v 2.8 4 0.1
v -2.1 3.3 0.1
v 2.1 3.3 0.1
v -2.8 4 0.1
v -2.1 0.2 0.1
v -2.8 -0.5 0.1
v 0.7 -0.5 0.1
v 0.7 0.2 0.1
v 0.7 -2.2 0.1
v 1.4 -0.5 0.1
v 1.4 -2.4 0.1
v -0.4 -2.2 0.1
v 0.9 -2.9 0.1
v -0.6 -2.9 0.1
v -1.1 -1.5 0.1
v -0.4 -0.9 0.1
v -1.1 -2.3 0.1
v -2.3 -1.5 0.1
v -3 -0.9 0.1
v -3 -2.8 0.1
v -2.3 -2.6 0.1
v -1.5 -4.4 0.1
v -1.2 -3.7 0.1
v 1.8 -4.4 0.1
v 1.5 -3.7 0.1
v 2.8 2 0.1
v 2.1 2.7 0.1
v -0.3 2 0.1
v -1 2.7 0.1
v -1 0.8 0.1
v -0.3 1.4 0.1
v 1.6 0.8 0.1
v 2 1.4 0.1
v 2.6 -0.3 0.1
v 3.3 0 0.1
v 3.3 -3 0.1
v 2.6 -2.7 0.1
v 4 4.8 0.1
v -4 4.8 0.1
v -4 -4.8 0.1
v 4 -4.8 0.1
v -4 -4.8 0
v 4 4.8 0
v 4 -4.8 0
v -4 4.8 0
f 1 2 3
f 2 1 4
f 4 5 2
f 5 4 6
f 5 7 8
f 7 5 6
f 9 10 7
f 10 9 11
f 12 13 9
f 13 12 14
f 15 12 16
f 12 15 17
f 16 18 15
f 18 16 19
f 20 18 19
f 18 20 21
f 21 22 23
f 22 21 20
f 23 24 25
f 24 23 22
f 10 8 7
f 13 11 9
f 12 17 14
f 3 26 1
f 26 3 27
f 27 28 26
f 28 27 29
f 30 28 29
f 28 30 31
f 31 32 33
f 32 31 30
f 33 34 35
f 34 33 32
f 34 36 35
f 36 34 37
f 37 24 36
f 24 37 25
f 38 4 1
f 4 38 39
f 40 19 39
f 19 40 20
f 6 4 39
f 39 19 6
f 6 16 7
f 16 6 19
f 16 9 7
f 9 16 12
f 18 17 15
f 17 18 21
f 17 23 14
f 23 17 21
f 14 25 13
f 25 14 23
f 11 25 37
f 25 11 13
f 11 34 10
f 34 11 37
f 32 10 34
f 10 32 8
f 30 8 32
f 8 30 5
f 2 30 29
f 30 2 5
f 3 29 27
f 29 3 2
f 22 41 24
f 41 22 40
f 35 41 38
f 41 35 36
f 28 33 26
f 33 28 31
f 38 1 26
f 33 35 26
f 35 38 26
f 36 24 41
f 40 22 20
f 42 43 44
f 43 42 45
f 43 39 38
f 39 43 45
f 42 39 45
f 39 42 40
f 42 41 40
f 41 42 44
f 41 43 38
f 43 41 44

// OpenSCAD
// file: ../p/4-4edge.scad
use <../lib.scad>
$fa=1; $fs=0.2;
function ldraw_lib__4_4edge(realsolid=false) = [
// 0 Circle 1.0
// 0 Name: 4-4edge.dat
// 0 Author: James Jessiman
// 0 !LDRAW_ORG Primitive UPDATE 2017-01
// 0 !LICENSE Licensed under CC BY 2.0 and CC BY 4.0 : see CAreadme.txt
// 
// 0 BFC CERTIFY CCW
  [0,"BFC","CERTIFY"],
  [0,"BFC","CCW"],
// 
// 0 !HISTORY 1998-12-15 [PTadmin] Official Update 1998-10
// 0 !HISTORY 2005-12-28 [PTadmin] Official Update 2005-01
// 0 !HISTORY 2007-06-24 [PTadmin] Header formatted for Contributor Agreement
// 0 !HISTORY 2008-07-01 [PTadmin] Official Update 2008-01
// 0 !HISTORY 2017-01-15 [Steffen] BFCed
// 0 !HISTORY 2017-12-30 [PTadmin] Official Update 2017-01
// 
// 
// 2 24 1 0 0 0.9239 0 0.3827
  [2,24,1,0,0,0.9239,0,0.3827],
// 2 24 0.9239 0 0.3827 0.7071 0 0.7071
  [2,24,0.9239,0,0.3827,0.7071,0,0.7071],
// 2 24 0.7071 0 0.7071 0.3827 0 0.9239
  [2,24,0.7071,0,0.7071,0.3827,0,0.9239],
// 2 24 0.3827 0 0.9239 0 0 1
  [2,24,0.3827,0,0.9239,0,0,1],
// 2 24 0 0 1 -0.3827 0 0.9239
  [2,24,0,0,1,-0.3827,0,0.9239],
// 2 24 -0.3827 0 0.9239 -0.7071 0 0.7071
  [2,24,-0.3827,0,0.9239,-0.7071,0,0.7071],
// 2 24 -0.7071 0 0.7071 -0.9239 0 0.3827
  [2,24,-0.7071,0,0.7071,-0.9239,0,0.3827],
// 2 24 -0.9239 0 0.3827 -1 0 -0
  [2,24,-0.9239,0,0.3827,-1,0,-0],
// 2 24 -1 0 -0 -0.9239 0 -0.3827
  [2,24,-1,0,-0,-0.9239,0,-0.3827],
// 2 24 -0.9239 0 -0.3827 -0.7071 0 -0.7071
  [2,24,-0.9239,0,-0.3827,-0.7071,0,-0.7071],
// 2 24 -0.7071 0 -0.7071 -0.3827 0 -0.9239
  [2,24,-0.7071,0,-0.7071,-0.3827,0,-0.9239],
// 2 24 -0.3827 0 -0.9239 0 0 -1
  [2,24,-0.3827,0,-0.9239,0,0,-1],
// 2 24 0 0 -1 0.3827 0 -0.9239
  [2,24,0,0,-1,0.3827,0,-0.9239],
// 2 24 0.3827 0 -0.9239 0.7071 0 -0.7071
  [2,24,0.3827,0,-0.9239,0.7071,0,-0.7071],
// 2 24 0.7071 0 -0.7071 0.9239 0 -0.3827
  [2,24,0.7071,0,-0.7071,0.9239,0,-0.3827],
// 2 24 0.9239 0 -0.3827 1 0 0
  [2,24,0.9239,0,-0.3827,1,0,0],
];
module ldraw_lib__4_4edge(step=0, col=false, unit=2/5, alt=false, line=0.2, solid=!$preview)
    makepoly(ldraw_lib__4_4edge(solid), step=step, col=col, unit=unit, alt=alt, line=line, solid=solid);
ldraw_lib__4_4edge(line=0.2);
// file: ../p/4-4disc.scad
use <../lib.scad>
$fa=1; $fs=0.2;
function ldraw_lib__4_4disc(realsolid=false) = [
// 0 Disc 1.0
// 0 Name: 4-4disc.dat
// 0 Author: James Jessiman
// 0 !LDRAW_ORG Primitive UPDATE 2002-02
// 0 !LICENSE Licensed under CC BY 2.0 and CC BY 4.0 : see CAreadme.txt
// 
// 0 BFC CERTIFY CCW
  [0,"BFC","CERTIFY"],
  [0,"BFC","CCW"],
// 
// 0 !HISTORY 1998-12-15 [PTadmin] Official Update 1998-10
// 0 !HISTORY 2002-03-23 [sbliss] Added BFC statement
// 0 !HISTORY 2002-04-25 [PTadmin] Official Update 2002-02
// 0 !HISTORY 2007-06-24 [PTadmin] Header formatted for Contributor Agreement
// 0 !HISTORY 2008-07-01 [PTadmin] Official Update 2008-01
// 
// 
// 3 16 0 0 0 1 0 0 0.9239 0 0.3827
  [3,16,0,0,0,1,0,0,0.9239,0,0.3827],
// 3 16 0 0 0 0.9239 0 0.3827 0.7071 0 0.7071
  [3,16,0,0,0,0.9239,0,0.3827,0.7071,0,0.7071],
// 3 16 0 0 0 0.7071 0 0.7071 0.3827 0 0.9239
  [3,16,0,0,0,0.7071,0,0.7071,0.3827,0,0.9239],
// 3 16 0 0 0 0.3827 0 0.9239 0 0 1
  [3,16,0,0,0,0.3827,0,0.9239,0,0,1],
// 3 16 0 0 0 0 0 1 -0.3827 0 0.9239
  [3,16,0,0,0,0,0,1,-0.3827,0,0.9239],
// 3 16 0 0 0 -0.3827 0 0.9239 -0.7071 0 0.7071
  [3,16,0,0,0,-0.3827,0,0.9239,-0.7071,0,0.7071],
// 3 16 0 0 0 -0.7071 0 0.7071 -0.9239 0 0.3827
  [3,16,0,0,0,-0.7071,0,0.7071,-0.9239,0,0.3827],
// 3 16 0 0 0 -0.9239 0 0.3827 -1 0 -0
  [3,16,0,0,0,-0.9239,0,0.3827,-1,0,-0],
// 3 16 0 0 0 -1 0 -0 -0.9239 0 -0.3827
  [3,16,0,0,0,-1,0,-0,-0.9239,0,-0.3827],
// 3 16 0 0 0 -0.9239 0 -0.3827 -0.7071 0 -0.7071
  [3,16,0,0,0,-0.9239,0,-0.3827,-0.7071,0,-0.7071],
// 3 16 0 0 0 -0.7071 0 -0.7071 -0.3827 0 -0.9239
  [3,16,0,0,0,-0.7071,0,-0.7071,-0.3827,0,-0.9239],
// 3 16 0 0 0 -0.3827 0 -0.9239 0 0 -1
  [3,16,0,0,0,-0.3827,0,-0.9239,0,0,-1],
// 3 16 0 0 0 0 0 -1 0.3827 0 -0.9239
  [3,16,0,0,0,0,0,-1,0.3827,0,-0.9239],
// 3 16 0 0 0 0.3827 0 -0.9239 0.7071 0 -0.7071
  [3,16,0,0,0,0.3827,0,-0.9239,0.7071,0,-0.7071],
// 3 16 0 0 0 0.7071 0 -0.7071 0.9239 0 -0.3827
  [3,16,0,0,0,0.7071,0,-0.7071,0.9239,0,-0.3827],
// 3 16 0 0 0 0.9239 0 -0.3827 1 0 0
  [3,16,0,0,0,0.9239,0,-0.3827,1,0,0],
// 0
];
module ldraw_lib__4_4disc(step=0, col=false, unit=2/5, alt=false, line=0.2, solid=!$preview)
    makepoly(ldraw_lib__4_4disc(solid), step=step, col=col, unit=unit, alt=alt, line=line, solid=solid);
ldraw_lib__4_4disc(line=0.2);
// file: ../p/4-4cyli.scad
use <../lib.scad>
$fa=1; $fs=0.2;
function ldraw_lib__4_4cyli(realsolid=false) = [
// 0 Cylinder 1.0
// 0 Name: 4-4cyli.dat
// 0 Author: James Jessiman
// 0 !LDRAW_ORG Primitive UPDATE 2005-01
// 0 !LICENSE Licensed under CC BY 2.0 and CC BY 4.0 : see CAreadme.txt
// 
// 0 BFC CERTIFY CCW
  [0,"BFC","CERTIFY"],
  [0,"BFC","CCW"],
// 
// 0 !HISTORY 1998-12-15 [PTadmin] Official Update 1998-10
// 0 !HISTORY 2002-03-23 [sbliss] Added BFC statement; merged headers from files in distributions LDraw 0.27 and Complete.
// 0 !HISTORY 2002-04-25 [PTadmin] Official Update 2002-02
// 0 !HISTORY 2004-12-14 [guyvivan] BFC CCW
// 0 !HISTORY 2005-12-28 [PTadmin] Official Update 2005-01
// 0 !HISTORY 2007-06-24 [PTadmin] Header formatted for Contributor Agreement
// 0 !HISTORY 2008-07-01 [PTadmin] Official Update 2008-01
// 
// 
// 4 16 1 1 0 0.9239 1 0.3827 0.9239 0 0.3827 1 0 0
  [4,16,1,1,0,0.9239,1,0.3827,0.9239,0,0.3827,1,0,0],
// 5 24 1 0 0 1 1 0 0.9239 0 0.3827 0.9239 0 -0.3827
  [5,24,1,0,0,1,1,0,0.9239,0,0.3827,0.9239,0,-0.3827],
// 4 16 0.9239 1 0.3827 0.7071 1 0.7071 0.7071 0 0.7071 0.9239 0 0.3827
  [4,16,0.9239,1,0.3827,0.7071,1,0.7071,0.7071,0,0.7071,0.9239,0,0.3827],
// 5 24 0.9239 0 0.3827 0.9239 1 0.3827 0.7071 0 0.7071 1 0 0
  [5,24,0.9239,0,0.3827,0.9239,1,0.3827,0.7071,0,0.7071,1,0,0],
// 4 16 0.7071 1 0.7071 0.3827 1 0.9239 0.3827 0 0.9239 0.7071 0 0.7071
  [4,16,0.7071,1,0.7071,0.3827,1,0.9239,0.3827,0,0.9239,0.7071,0,0.7071],
// 5 24 0.7071 0 0.7071 0.7071 1 0.7071 0.3827 0 0.9239 0.9239 0 0.3827
  [5,24,0.7071,0,0.7071,0.7071,1,0.7071,0.3827,0,0.9239,0.9239,0,0.3827],
// 4 16 0.3827 1 0.9239 0 1 1 0 0 1 0.3827 0 0.9239
  [4,16,0.3827,1,0.9239,0,1,1,0,0,1,0.3827,0,0.9239],
// 5 24 0.3827 0 0.9239 0.3827 1 0.9239 0 0 1 0.7071 0 0.7071
  [5,24,0.3827,0,0.9239,0.3827,1,0.9239,0,0,1,0.7071,0,0.7071],
// 4 16 0 1 1 -0.3827 1 0.9239 -0.3827 0 0.9239 0 0 1
  [4,16,0,1,1,-0.3827,1,0.9239,-0.3827,0,0.9239,0,0,1],
// 5 24 0 0 1 0 1 1 -0.3827 0 0.9239 0.3827 0 0.9239
  [5,24,0,0,1,0,1,1,-0.3827,0,0.9239,0.3827,0,0.9239],
// 4 16 -0.3827 1 0.9239 -0.7071 1 0.7071 -0.7071 0 0.7071 -0.3827 0 0.9239
  [4,16,-0.3827,1,0.9239,-0.7071,1,0.7071,-0.7071,0,0.7071,-0.3827,0,0.9239],
// 5 24 -0.3827 0 0.9239 -0.3827 1 0.9239 -0.7071 0 0.7071 0 0 1
  [5,24,-0.3827,0,0.9239,-0.3827,1,0.9239,-0.7071,0,0.7071,0,0,1],
// 4 16 -0.7071 1 0.7071 -0.9239 1 0.3827 -0.9239 0 0.3827 -0.7071 0 0.7071
  [4,16,-0.7071,1,0.7071,-0.9239,1,0.3827,-0.9239,0,0.3827,-0.7071,0,0.7071],
// 5 24 -0.7071 0 0.7071 -0.7071 1 0.7071 -0.9239 0 0.3827 -0.3827 0 0.9239
  [5,24,-0.7071,0,0.7071,-0.7071,1,0.7071,-0.9239,0,0.3827,-0.3827,0,0.9239],
// 4 16 -0.9239 1 0.3827 -1 1 0 -1 0 0 -0.9239 0 0.3827
  [4,16,-0.9239,1,0.3827,-1,1,0,-1,0,0,-0.9239,0,0.3827],
// 5 24 -0.9239 0 0.3827 -0.9239 1 0.3827 -1 0 0 -0.7071 0 0.7071
  [5,24,-0.9239,0,0.3827,-0.9239,1,0.3827,-1,0,0,-0.7071,0,0.7071],
// 4 16 -1 1 0 -0.9239 1 -0.3827 -0.9239 0 -0.3827 -1 0 0
  [4,16,-1,1,0,-0.9239,1,-0.3827,-0.9239,0,-0.3827,-1,0,0],
// 5 24 -1 0 0 -1 1 0 -0.9239 0 -0.3827 -0.9239 0 0.3827
  [5,24,-1,0,0,-1,1,0,-0.9239,0,-0.3827,-0.9239,0,0.3827],
// 4 16 -0.9239 1 -0.3827 -0.7071 1 -0.7071 -0.7071 0 -0.7071 -0.9239 0 -0.3827
  [4,16,-0.9239,1,-0.3827,-0.7071,1,-0.7071,-0.7071,0,-0.7071,-0.9239,0,-0.3827],
// 5 24 -0.9239 0 -0.3827 -0.9239 1 -0.3827 -0.7071 0 -0.7071 -1 0 0
  [5,24,-0.9239,0,-0.3827,-0.9239,1,-0.3827,-0.7071,0,-0.7071,-1,0,0],
// 4 16 -0.7071 1 -0.7071 -0.3827 1 -0.9239 -0.3827 0 -0.9239 -0.7071 0 -0.7071
  [4,16,-0.7071,1,-0.7071,-0.3827,1,-0.9239,-0.3827,0,-0.9239,-0.7071,0,-0.7071],
// 5 24 -0.7071 0 -0.7071 -0.7071 1 -0.7071 -0.3827 0 -0.9239 -0.9239 0 -0.3827
  [5,24,-0.7071,0,-0.7071,-0.7071,1,-0.7071,-0.3827,0,-0.9239,-0.9239,0,-0.3827],
// 4 16 -0.3827 1 -0.9239 0 1 -1 0 0 -1 -0.3827 0 -0.9239
  [4,16,-0.3827,1,-0.9239,0,1,-1,0,0,-1,-0.3827,0,-0.9239],
// 5 24 -0.3827 0 -0.9239 -0.3827 1 -0.9239 0 0 -1 -0.7071 0 -0.7071
  [5,24,-0.3827,0,-0.9239,-0.3827,1,-0.9239,0,0,-1,-0.7071,0,-0.7071],
// 4 16 0 1 -1 0.3827 1 -0.9239 0.3827 0 -0.9239 0 0 -1
  [4,16,0,1,-1,0.3827,1,-0.9239,0.3827,0,-0.9239,0,0,-1],
// 5 24 0 0 -1 0 1 -1 0.3827 0 -0.9239 -0.3827 0 -0.9239
  [5,24,0,0,-1,0,1,-1,0.3827,0,-0.9239,-0.3827,0,-0.9239],
// 4 16 0.3827 1 -0.9239 0.7071 1 -0.7071 0.7071 0 -0.7071 0.3827 0 -0.9239
  [4,16,0.3827,1,-0.9239,0.7071,1,-0.7071,0.7071,0,-0.7071,0.3827,0,-0.9239],
// 5 24 0.3827 0 -0.9239 0.3827 1 -0.9239 0.7071 0 -0.7071 0 0 -1
  [5,24,0.3827,0,-0.9239,0.3827,1,-0.9239,0.7071,0,-0.7071,0,0,-1],
// 4 16 0.7071 1 -0.7071 0.9239 1 -0.3827 0.9239 0 -0.3827 0.7071 0 -0.7071
  [4,16,0.7071,1,-0.7071,0.9239,1,-0.3827,0.9239,0,-0.3827,0.7071,0,-0.7071],
// 5 24 0.7071 0 -0.7071 0.7071 1 -0.7071 0.9239 0 -0.3827 0.3827 0 -0.9239
  [5,24,0.7071,0,-0.7071,0.7071,1,-0.7071,0.9239,0,-0.3827,0.3827,0,-0.9239],
// 4 16 0.9239 1 -0.3827 1 1 0 1 0 0 0.9239 0 -0.3827
  [4,16,0.9239,1,-0.3827,1,1,0,1,0,0,0.9239,0,-0.3827],
// 5 24 0.9239 0 -0.3827 0.9239 1 -0.3827 1 0 0 0.7071 0 -0.7071
  [5,24,0.9239,0,-0.3827,0.9239,1,-0.3827,1,0,0,0.7071,0,-0.7071],
// 0
];
module ldraw_lib__4_4cyli(step=0, col=false, unit=2/5, alt=false, line=0.2, solid=!$preview)
    makepoly(ldraw_lib__4_4cyli(solid), step=step, col=col, unit=unit, alt=alt, line=line, solid=solid);
ldraw_lib__4_4cyli(line=0.2);
// file: ../p/stud3.scad
use <../lib.scad>
use <4-4cyli.scad>
use <4-4disc.scad>
use <4-4edge.scad>
$fa=1; $fs=0.2;
function ldraw_lib__stud3(realsolid=false) = realsolid ? 
    [openscad(translate([0,0,-eps()], o=cylinder(4+eps(), r=4)),2)] : [
// 0 Stud Tube Solid
// 0 Name: stud3.dat
// 0 Author: James Jessiman
// 0 !LDRAW_ORG Primitive UPDATE 2012-01
// 0 !LICENSE Licensed under CC BY 2.0 and CC BY 4.0 : see CAreadme.txt
// 
// 0 BFC CERTIFY CCW
  [0,"BFC","CERTIFY"],
  [0,"BFC","CCW"],
// 
// 0 !HISTORY 2002-04-04 [sbliss] Modified for BFC compliance
// 0 !HISTORY 2002-04-25 [PTadmin] Official Update 2002-02
// 0 !HISTORY 2007-06-24 [PTadmin] Header formatted for Contributor Agreement
// 0 !HISTORY 2008-07-01 [PTadmin] Official Update 2008-01
// 0 !HISTORY 2012-02-16 [Philo] Changed to CCW
// 0 !HISTORY 2012-03-30 [PTadmin] Official Update 2012-01
// 
// 
// 1 16 0 -4 0 4 0 0 0 1 0 0 0 4 4-4edge.dat
  [1,16,0,-4,0,4,0,0,0,1,0,0,0,4, ldraw_lib__4_4edge(realsolid)],
// 1 16 0 0 0 4 0 0 0 1 0 0 0 4 4-4edge.dat
  [1,16,0,0,0,4,0,0,0,1,0,0,0,4, ldraw_lib__4_4edge(realsolid)],
// 1 16 0 -4 0 4 0 0 0 1 0 0 0 4 4-4disc.dat
  [1,16,0,-4,0,4,0,0,0,1,0,0,0,4, ldraw_lib__4_4disc(realsolid)],
// 1 16 0 -4 0 4 0 0 0 4 0 0 0 4 4-4cyli.dat
  [1,16,0,-4,0,4,0,0,0,4,0,0,0,4, ldraw_lib__4_4cyli(realsolid)],
];
module ldraw_lib__stud3(step=0, col=false, unit=2/5, alt=false, line=0.2, solid=!$preview)
    makepoly(ldraw_lib__stud3(solid), step=step, col=col, unit=unit, alt=alt, line=line, solid=solid);
ldraw_lib__stud3(line=0.2);
// file: ../p/stud.scad
use <../lib.scad>
use <4-4cyli.scad>
use <4-4disc.scad>
use <4-4edge.scad>
$fa=1; $fs=0.2;
function ldraw_lib__stud(realsolid=false) = realsolid ? 
    [openscad(translate([0,0,-eps()], o=cylinder(4+eps(), r=6)),2)] : [
// 0 Stud
// 0 Name: stud.dat
// 0 Author: James Jessiman
// 0 !LDRAW_ORG Primitive UPDATE 2012-01
// 0 !LICENSE Licensed under CC BY 2.0 and CC BY 4.0 : see CAreadme.txt
// 
// 0 BFC CERTIFY CCW
  [0,"BFC","CERTIFY"],
  [0,"BFC","CCW"],
// 
// 0 !HISTORY 2002-04-04 [sbliss] Modified for BFC compliance
// 0 !HISTORY 2002-04-25 [PTadmin] Official Update 2002-02
// 0 !HISTORY 2007-06-24 [PTadmin] Header formatted for Contributor Agreement
// 0 !HISTORY 2008-07-01 [PTadmin] Official Update 2008-01
// 0 !HISTORY 2012-02-16 [Philo] Changed to CCW
// 0 !HISTORY 2012-03-30 [PTadmin] Official Update 2012-01
// 
// 
// 1 16 0 0 0 6 0 0 0 1 0 0 0 6 4-4edge.dat
  [1,16,0,0,0,6,0,0,0,1,0,0,0,6, ldraw_lib__4_4edge(realsolid)],
// 1 16 0 -4 0 6 0 0 0 1 0 0 0 6 4-4edge.dat
  [1,16,0,-4,0,6,0,0,0,1,0,0,0,6, ldraw_lib__4_4edge(realsolid)],
// 1 16 0 0 0 6 0 0 0 -4 0 0 0 6 4-4cyli.dat
  [1,16,0,0,0,6,0,0,0,-4,0,0,0,6, ldraw_lib__4_4cyli(realsolid)],
// 1 16 0 -4 0 6 0 0 0 1 0 0 0 6 4-4disc.dat
  [1,16,0,-4,0,6,0,0,0,1,0,0,0,6, ldraw_lib__4_4disc(realsolid)],
];
module ldraw_lib__stud(step=0, col=false, unit=2/5, alt=false, line=0.2, solid=!$preview)
    makepoly(ldraw_lib__stud(solid), step=step, col=col, unit=unit, alt=alt, line=line, solid=solid);
ldraw_lib__stud(line=0.2);
// file: ../p/box5.scad
use <../lib.scad>
$fa=1; $fs=0.2;
function ldraw_lib__box5(realsolid=false) = [
// 0 Box with 5 Faces and All Edges
// 0 Name: box5.dat
// 0 Author: James Jessiman
// 0 !LDRAW_ORG Primitive UPDATE 2012-01
// 0 !LICENSE Licensed under CC BY 2.0 and CC BY 4.0 : see CAreadme.txt
// 
// 0 BFC CERTIFY CCW
  [0,"BFC","CERTIFY"],
  [0,"BFC","CCW"],
// 
// 0 !HISTORY 2002-04-03 [sbliss] Modified for BFC compliance
// 0 !HISTORY 2002-04-25 [PTadmin] Official Update 2002-02
// 0 !HISTORY 2007-06-24 [PTadmin] Header formatted for Contributor Agreement
// 0 !HISTORY 2008-07-01 [PTadmin] Official Update 2008-01
// 0 !HISTORY 2012-02-16 [Philo] Changed to CCW
// 0 !HISTORY 2012-03-30 [PTadmin] Official Update 2012-01
// 
// 
// 2 24 1 1 1 -1 1 1
  [2,24,1,1,1,-1,1,1],
// 2 24 -1 1 1 -1 1 -1
  [2,24,-1,1,1,-1,1,-1],
// 2 24 -1 1 -1 1 1 -1
  [2,24,-1,1,-1,1,1,-1],
// 2 24 1 1 -1 1 1 1
  [2,24,1,1,-1,1,1,1],
// 2 24 1 0 1 -1 0 1
  [2,24,1,0,1,-1,0,1],
// 2 24 -1 0 1 -1 0 -1
  [2,24,-1,0,1,-1,0,-1],
// 2 24 -1 0 -1 1 0 -1
  [2,24,-1,0,-1,1,0,-1],
// 2 24 1 0 -1 1 0 1
  [2,24,1,0,-1,1,0,1],
// 2 24 1 0 1 1 1 1
  [2,24,1,0,1,1,1,1],
// 2 24 -1 0 1 -1 1 1
  [2,24,-1,0,1,-1,1,1],
// 2 24 1 0 -1 1 1 -1
  [2,24,1,0,-1,1,1,-1],
// 2 24 -1 0 -1 -1 1 -1
  [2,24,-1,0,-1,-1,1,-1],
// 4 16 -1 1 1 1 1 1 1 1 -1 -1 1 -1
  [4,16,-1,1,1,1,1,1,1,1,-1,-1,1,-1],
// 4 16 -1 1 1 -1 0 1 1 0 1 1 1 1
  [4,16,-1,1,1,-1,0,1,1,0,1,1,1,1],
// 4 16 -1 1 -1 -1 0 -1 -1 0 1 -1 1 1
  [4,16,-1,1,-1,-1,0,-1,-1,0,1,-1,1,1],
// 4 16 1 1 -1 1 0 -1 -1 0 -1 -1 1 -1
  [4,16,1,1,-1,1,0,-1,-1,0,-1,-1,1,-1],
// 4 16 1 1 1 1 0 1 1 0 -1 1 1 -1
  [4,16,1,1,1,1,0,1,1,0,-1,1,1,-1],
];
module ldraw_lib__box5(step=0, col=false, unit=2/5, alt=false, line=0.2, solid=!$preview)
    makepoly(ldraw_lib__box5(solid), step=step, col=col, unit=unit, alt=alt, line=line, solid=solid);
ldraw_lib__box5(line=0.2);
// file: ../p/box4t.scad
use <../lib.scad>
$fa=1; $fs=0.2;
function ldraw_lib__box4t(realsolid=false) = [
// 0 Box with 4 Adjacent Faces and All Edges
// 0 Name: box4t.dat
// 0 Author: Tore Eriksson [Tore_Eriksson]
// 0 !LDRAW_ORG Primitive UPDATE 2003-02
// 0 !LICENSE Licensed under CC BY 2.0 and CC BY 4.0 : see CAreadme.txt
// 
// 0 BFC CERTIFY CCW
  [0,"BFC","CERTIFY"],
  [0,"BFC","CCW"],
// 
// 0 !HISTORY 1997-09-29 [PTadmin] Official Update 1997-15
// 0 !HISTORY 2002-08-31 [izanette] Modified with WINDZ for BFC compliance
// 0 !HISTORY 2003-08-01 [PTadmin] Official Update 2003-02
// 0 !HISTORY 2007-06-24 [PTadmin] Header formatted for Contributor Agreement
// 0 !HISTORY 2008-07-01 [PTadmin] Official Update 2008-01
// 
// 
// 2 24 1 1 1 -1 1 1
  [2,24,1,1,1,-1,1,1],
// 2 24 -1 1 1 -1 1 -1
  [2,24,-1,1,1,-1,1,-1],
// 2 24 -1 1 -1 1 1 -1
  [2,24,-1,1,-1,1,1,-1],
// 2 24 1 1 -1 1 1 1
  [2,24,1,1,-1,1,1,1],
// 2 24 1 0 1 -1 0 1
  [2,24,1,0,1,-1,0,1],
// 2 24 -1 0 1 -1 0 -1
  [2,24,-1,0,1,-1,0,-1],
// 2 24 -1 0 -1 1 0 -1
  [2,24,-1,0,-1,1,0,-1],
// 2 24 1 0 -1 1 0 1
  [2,24,1,0,-1,1,0,1],
// 2 24 1 0 1 1 1 1
  [2,24,1,0,1,1,1,1],
// 2 24 -1 0 1 -1 1 1
  [2,24,-1,0,1,-1,1,1],
// 2 24 1 0 -1 1 1 -1
  [2,24,1,0,-1,1,1,-1],
// 2 24 -1 0 -1 -1 1 -1
  [2,24,-1,0,-1,-1,1,-1],
// 4 16 1 1 1 1 1 -1 -1 1 -1 -1 1 1
  [4,16,1,1,1,1,1,-1,-1,1,-1,-1,1,1],
// 4 16 1 1 1 -1 1 1 -1 0 1 1 0 1
  [4,16,1,1,1,-1,1,1,-1,0,1,1,0,1],
// 4 16 -1 1 1 -1 1 -1 -1 0 -1 -1 0 1
  [4,16,-1,1,1,-1,1,-1,-1,0,-1,-1,0,1],
// 0 4 16 -1 1 -1 -1 0 -1 1 0 -1 1 1 -1
// 4 16 1 1 -1 1 1 1 1 0 1 1 0 -1
  [4,16,1,1,-1,1,1,1,1,0,1,1,0,-1],
// 0
];
module ldraw_lib__box4t(step=0, col=false, unit=2/5, alt=false, line=0.2, solid=!$preview)
    makepoly(ldraw_lib__box4t(solid), step=step, col=col, unit=unit, alt=alt, line=line, solid=solid);
ldraw_lib__box4t(line=0.2);
// file: s/3004s01.scad
use <../../lib.scad>
use <../../p/box4t.scad>
use <../../p/box5.scad>
use <../../p/stud.scad>
use <../../p/stud3.scad>
$fa=1; $fs=0.2;
function ldraw_lib__s__3004s01(realsolid=false) = [
// 0 ~Brick  1 x  2 without Front Face
// 0 Name: s\3004s01.dat
// 0 Author: James Jessiman
// 0 !LDRAW_ORG Subpart UPDATE 2003-03
// 0 !LICENSE Licensed under CC BY 2.0 and CC BY 4.0 : see CAreadme.txt
// 
// 0 BFC CERTIFY CCW
  [0,"BFC","CERTIFY"],
  [0,"BFC","CCW"],
// 
// 0 !HISTORY 2003-09-07 [jriley] Subfiling, BFC
// 0 !HISTORY 2003-12-19 [PTadmin] Official Update 2003-03
// 0 !HISTORY 2007-08-29 [PTadmin] Header formatted for Contributor Agreement
// 0 !HISTORY 2008-07-01 [PTadmin] Official Update 2008-01
// 
// 
// 1 16 0 4 0 1 0 0 0 -5 0 0 0 1 stud3.dat
  [1,16,0,4,0,1,0,0,0,-5,0,0,0,1, ldraw_lib__stud3(realsolid)],
// 0 BFC INVERTNEXT
  [0,"BFC","INVERTNEXT"],
// 1 16 0 24 0 16 0 0 0 -20 0 0 0 6 box5.dat
  [1,16,0,24,0,16,0,0,0,-20,0,0,0,6, ldraw_lib__box5(realsolid)],
// 4 16 20 24 10 16 24 6 -16 24 6 -20 24 10
  [4,16,20,24,10,16,24,6,-16,24,6,-20,24,10],
// 4 16 -20 24 10 -16 24 6 -16 24 -6 -20 24 -10
  [4,16,-20,24,10,-16,24,6,-16,24,-6,-20,24,-10],
// 4 16 -20 24 -10 -16 24 -6 16 24 -6 20 24 -10
  [4,16,-20,24,-10,-16,24,-6,16,24,-6,20,24,-10],
// 4 16 20 24 -10 16 24 -6 16 24 6 20 24 10
  [4,16,20,24,-10,16,24,-6,16,24,6,20,24,10],
// 1 16 0 24 0 20 0 0 0 -24 0 0 0 10 box4t.dat
  [1,16,0,24,0,20,0,0,0,-24,0,0,0,10, ldraw_lib__box4t(realsolid)],
// 1 16 10 0 0 1 0 0 0 1 0 0 0 1 stud.dat
  [1,16,10,0,0,1,0,0,0,1,0,0,0,1, ldraw_lib__stud(realsolid)],
// 1 16 -10 0 0 1 0 0 0 1 0 0 0 1 stud.dat
  [1,16,-10,0,0,1,0,0,0,1,0,0,0,1, ldraw_lib__stud(realsolid)],
// 0
];
module ldraw_lib__s__3004s01(step=0, col=false, unit=2/5, alt=false, line=0.2, solid=!$preview)
    makepoly(ldraw_lib__s__3004s01(solid), step=step, col=col, unit=unit, alt=alt, line=line, solid=solid);
ldraw_lib__s__3004s01(line=0.2);
// file: ../p/box5-12.scad
use <../lib.scad>
$fa=1; $fs=0.2;
function ldraw_lib__box5_12(realsolid=false) = [
// 0 Box with 5 Faces without Any Edges
// 0 Name: box5-12.dat
// 0 Author: Chris Dee [cwdee]
// 0 !LDRAW_ORG Primitive UPDATE 2009-02
// 0 !LICENSE Licensed under CC BY 2.0 and CC BY 4.0 : see CAreadme.txt
// 
// 0 BFC CERTIFY CCW
  [0,"BFC","CERTIFY"],
  [0,"BFC","CCW"],
// 
// 0 !HISTORY 2009-09-03 [PTadmin] Official Update 2009-02
// 
// 
// 4 16 1 1 1 1 1 -1 -1 1 -1 -1 1 1
  [4,16,1,1,1,1,1,-1,-1,1,-1,-1,1,1],
// 4 16 -1 0 1 1 0 1 1 1 1 -1 1 1
  [4,16,-1,0,1,1,0,1,1,1,1,-1,1,1],
// 4 16 -1 0 -1 -1 0 1 -1 1 1 -1 1 -1
  [4,16,-1,0,-1,-1,0,1,-1,1,1,-1,1,-1],
// 4 16 1 0 -1 -1 0 -1 -1 1 -1 1 1 -1
  [4,16,1,0,-1,-1,0,-1,-1,1,-1,1,1,-1],
// 4 16 1 0 1 1 0 -1 1 1 -1 1 1 1
  [4,16,1,0,1,1,0,-1,1,1,-1,1,1,1],
// 0
];
module ldraw_lib__box5_12(step=0, col=false, unit=2/5, alt=false, line=0.2, solid=!$preview)
    makepoly(ldraw_lib__box5_12(solid), step=step, col=col, unit=unit, alt=alt, line=line, solid=solid);
ldraw_lib__box5_12(line=0.2);
// file: 3004.scad
use <../lib.scad>
use <s/3004s01.scad>
$fa=1; $fs=0.2;
function ldraw_lib__3004(realsolid=false) = [
// 0 Brick  1 x  2
// 0 Name: 3004.dat
// 0 Author: James Jessiman
// 0 !LDRAW_ORG Part UPDATE 2022-05
// 0 !LICENSE Licensed under CC BY 2.0 and CC BY 4.0 : see CAreadme.txt
// 
// 0 BFC CERTIFY CCW
  [0,"BFC","CERTIFY"],
  [0,"BFC","CCW"],
// 
// 0 !HISTORY 2001-10-26 [PTadmin] Official Update 2001-01
// 0 !HISTORY 2002-05-07 {unknown} BFC Certification
// 0 !HISTORY 2002-06-11 [PTadmin] Official Update 2002-03
// 0 !HISTORY 2007-05-07 [PTadmin] Header formatted for Contributor Agreement
// 0 !HISTORY 2008-07-01 [PTadmin] Official Update 2008-01
// 0 !HISTORY 2022-08-04 [MagFors] Using subfile
// 0 !HISTORY 2022-09-15 [PTadmin] Official Update 2022-05
// 
// 
// 1 16 0 0 0 1 0 0 0 1 0 0 0 1 s\3004s01.dat
  [1,16,0,0,0,1,0,0,0,1,0,0,0,1, ldraw_lib__s__3004s01(realsolid)],
// 4 16 -20 24 -10 20 24 -10 20 0 -10 -20 0 -10
  [4,16,-20,24,-10,20,24,-10,20,0,-10,-20,0,-10],
];
module ldraw_lib__3004(step=0, col=false, unit=2/5, alt=false, line=0.2, solid=!$preview)
    makepoly(ldraw_lib__3004(solid), step=step, col=col, unit=unit, alt=alt, line=line, solid=solid);
ldraw_lib__3004(line=0.2);
// file: 164365c.scad
use <../lib.scad>
use <../p/box5-12.scad>
$fa=1; $fs=0.2;
function ldraw_lib__164365c(realsolid=false) = [
// 0 Sticker  1.2 x  1 with Red Outline "5"
// 0 Name: 164365c.dat
// 0 Author: Michael Heidemann [mikeheide]
// 0 !LDRAW_ORG Part UPDATE 2012-02
// 0 !LICENSE Licensed under CC BY 2.0 and CC BY 4.0 : see CAreadme.txt
// 
// 0 BFC CERTIFY CCW
  [0,"BFC","CERTIFY"],
  [0,"BFC","CCW"],
// 
// 0 !KEYWORDS set 6440
// 
// 0 !HISTORY 2012-08-09 [PTadmin] Official Update 2012-02
// 
// 
// 4 4 5.25 -0.25 8.25 7 -0.25 10 -7 -0.25 10 -5.25 -0.25 8.25
  [4,4,5.25,-0.25,8.25,7,-0.25,10,-7,-0.25,10,-5.25,-0.25,8.25],
// 4 4 -5.25 -0.25 0.5 -5.25 -0.25 8.25 -7 -0.25 10 -7 -0.25 -1.25
  [4,4,-5.25,-0.25,0.5,-5.25,-0.25,8.25,-7,-0.25,10,-7,-0.25,-1.25],
// 4 4 -7 -0.25 -1.25 1.75 -0.25 -1.25 1.75 -0.25 0.5 -5.25 -0.25 0.5
  [4,4,-7,-0.25,-1.25,1.75,-0.25,-1.25,1.75,-0.25,0.5,-5.25,-0.25,0.5],
// 4 4 3.5 -0.25 -6 3.5 -0.25 -1.25 1.75 -0.25 -1.25 1.75 -0.25 -5.5
  [4,4,3.5,-0.25,-6,3.5,-0.25,-1.25,1.75,-0.25,-1.25,1.75,-0.25,-5.5],
// 4 4 1.75 -0.25 -5.5 -1 -0.25 -5.5 -1.5 -0.25 -7.25 2.25 -0.25 -7.25
  [4,4,1.75,-0.25,-5.5,-1,-0.25,-5.5,-1.5,-0.25,-7.25,2.25,-0.25,-7.25],
// 4 4 -2.75 -0.25 -3.75 -2.75 -0.25 -5.75 -1 -0.25 -5.5 -1 -0.25 -2.25
  [4,4,-2.75,-0.25,-3.75,-2.75,-0.25,-5.75,-1,-0.25,-5.5,-1,-0.25,-2.25],
// 4 4 -1 -0.25 -2.25 -7.5 -0.25 -2.25 -5.75 -0.25 -3.75 -2.75 -0.25 -3.75
  [4,4,-1,-0.25,-2.25,-7.5,-0.25,-2.25,-5.75,-0.25,-3.75,-2.75,-0.25,-3.75],
// 4 4 -7.5 -0.25 -2.25 -7.5 -0.25 -7 -5.75 -0.25 -6.5 -5.75 -0.25 -3.75
  [4,4,-7.5,-0.25,-2.25,-7.5,-0.25,-7,-5.75,-0.25,-6.5,-5.75,-0.25,-3.75],
// 4 4 -3.75 -0.25 -11 -3 -0.25 -9.25 -5.75 -0.25 -6.5 -7.5 -0.25 -7
  [4,4,-3.75,-0.25,-11,-3,-0.25,-9.25,-5.75,-0.25,-6.5,-7.5,-0.25,-7],
// 4 4 4.5 -0.25 -11 3.75 -0.25 -9.25 -3 -0.25 -9.25 -3.75 -0.25 -11
  [4,4,4.5,-0.25,-11,3.75,-0.25,-9.25,-3,-0.25,-9.25,-3.75,-0.25,-11],
// 3 4 3.5 -0.25 -1.25 1.75 -0.25 0.5 1.75 -0.25 -1.25
  [3,4,3.5,-0.25,-1.25,1.75,-0.25,0.5,1.75,-0.25,-1.25],
// 3 4 2.25 -0.25 -7.25 3.5 -0.25 -6 1.75 -0.25 -5.5
  [3,4,2.25,-0.25,-7.25,3.5,-0.25,-6,1.75,-0.25,-5.5],
// 3 4 -1 -0.25 -5.5 -2.75 -0.25 -5.75 -1.5 -0.25 -7.25
  [3,4,-1,-0.25,-5.5,-2.75,-0.25,-5.75,-1.5,-0.25,-7.25],
// 4 4 7 -0.25 5 7 -0.25 10 5.25 -0.25 8.25 5.25 -0.25 6.75
  [4,4,7,-0.25,5,7,-0.25,10,5.25,-0.25,8.25,5.25,-0.25,6.75],
// 4 4 -0.75 -0.25 5 7 -0.25 5 5.25 -0.25 6.75 -2.5 -0.25 6.75
  [4,4,-0.75,-0.25,5,7,-0.25,5,5.25,-0.25,6.75,-2.5,-0.25,6.75],
// 4 4 -0.75 -0.25 3.5 -0.75 -0.25 5 -2.5 -0.25 6.75 -2.5 -0.25 2
  [4,4,-0.75,-0.25,3.5,-0.75,-0.25,5,-2.5,-0.25,6.75,-2.5,-0.25,2],
// 4 4 5 -0.25 3.5 -0.75 -0.25 3.5 -2.5 -0.25 2 4 -0.25 2
  [4,4,5,-0.25,3.5,-0.75,-0.25,3.5,-2.5,-0.25,2,4,-0.25,2],
// 4 4 8.25 -0.25 0 5 -0.25 3.5 4 -0.25 2 6.5 -0.25 -0.75
  [4,4,8.25,-0.25,0,5,-0.25,3.5,4,-0.25,2,6.5,-0.25,-0.75],
// 4 4 8.25 -0.25 -7.5 8.25 -0.25 0 6.5 -0.25 -0.75 6.5 -0.25 -6.75
  [4,4,8.25,-0.25,-7.5,8.25,-0.25,0,6.5,-0.25,-0.75,6.5,-0.25,-6.75],
// 4 4 6.5 -0.25 -6.75 3.75 -0.25 -9.25 4.5 -0.25 -11 8.25 -0.25 -7.5
  [4,4,6.5,-0.25,-6.75,3.75,-0.25,-9.25,4.5,-0.25,-11,8.25,-0.25,-7.5],
// 4 16 -10 -0.25 12 -7 -0.25 10 7 -0.25 10 10 -0.25 12
  [4,16,-10,-0.25,12,-7,-0.25,10,7,-0.25,10,10,-0.25,12],
// 4 16 -10 -0.25 -12 -7.5 -0.25 -7 -7.5 -0.25 -2.25 -10 -0.25 12
  [4,16,-10,-0.25,-12,-7.5,-0.25,-7,-7.5,-0.25,-2.25,-10,-0.25,12],
// 3 16 -7 -0.25 -1.25 -7 -0.25 10 -10 -0.25 12
  [3,16,-7,-0.25,-1.25,-7,-0.25,10,-10,-0.25,12],
// 3 16 -10 -0.25 12 -7.5 -0.25 -2.25 -7 -0.25 -1.25
  [3,16,-10,-0.25,12,-7.5,-0.25,-2.25,-7,-0.25,-1.25],
// 4 16 -7 -0.25 -1.25 -7.5 -0.25 -2.25 -1 -0.25 -2.25 1.75 -0.25 -1.25
  [4,16,-7,-0.25,-1.25,-7.5,-0.25,-2.25,-1,-0.25,-2.25,1.75,-0.25,-1.25],
// 4 16 1.75 -0.25 -1.25 -1 -0.25 -2.25 -1 -0.25 -5.5 1.75 -0.25 -5.5
  [4,16,1.75,-0.25,-1.25,-1,-0.25,-2.25,-1,-0.25,-5.5,1.75,-0.25,-5.5],
// 4 16 -2.75 -0.25 -5.75 -2.75 -0.25 -3.75 -5.75 -0.25 -3.75 -5.75 -0.25 -6.5
  [4,16,-2.75,-0.25,-5.75,-2.75,-0.25,-3.75,-5.75,-0.25,-3.75,-5.75,-0.25,-6.5],
// 4 16 -1.5 -0.25 -7.25 -2.75 -0.25 -5.75 -5.75 -0.25 -6.5 -3 -0.25 -9.25
  [4,16,-1.5,-0.25,-7.25,-2.75,-0.25,-5.75,-5.75,-0.25,-6.5,-3,-0.25,-9.25],
// 4 16 2.25 -0.25 -7.25 -1.5 -0.25 -7.25 -3 -0.25 -9.25 3.75 -0.25 -9.25
  [4,16,2.25,-0.25,-7.25,-1.5,-0.25,-7.25,-3,-0.25,-9.25,3.75,-0.25,-9.25],
// 4 16 6.5 -0.25 -6.75 3.5 -0.25 -6 2.25 -0.25 -7.25 3.75 -0.25 -9.25
  [4,16,6.5,-0.25,-6.75,3.5,-0.25,-6,2.25,-0.25,-7.25,3.75,-0.25,-9.25],
// 4 16 6.5 -0.25 -0.75 3.5 -0.25 -1.25 3.5 -0.25 -6 6.5 -0.25 -6.75
  [4,16,6.5,-0.25,-0.75,3.5,-0.25,-1.25,3.5,-0.25,-6,6.5,-0.25,-6.75],
// 4 16 4 -0.25 2 1.75 -0.25 0.5 3.5 -0.25 -1.25 6.5 -0.25 -0.75
  [4,16,4,-0.25,2,1.75,-0.25,0.5,3.5,-0.25,-1.25,6.5,-0.25,-0.75],
// 4 16 1.75 -0.25 0.5 4 -0.25 2 -2.5 -0.25 2 -5.25 -0.25 0.5
  [4,16,1.75,-0.25,0.5,4,-0.25,2,-2.5,-0.25,2,-5.25,-0.25,0.5],
// 4 16 -2.5 -0.25 6.75 -5.25 -0.25 8.25 -5.25 -0.25 0.5 -2.5 -0.25 2
  [4,16,-2.5,-0.25,6.75,-5.25,-0.25,8.25,-5.25,-0.25,0.5,-2.5,-0.25,2],
// 4 16 5.25 -0.25 6.75 5.25 -0.25 8.25 -5.25 -0.25 8.25 -2.5 -0.25 6.75
  [4,16,5.25,-0.25,6.75,5.25,-0.25,8.25,-5.25,-0.25,8.25,-2.5,-0.25,6.75],
// 4 16 4.5 -0.25 -11 -3.75 -0.25 -11 -10 -0.25 -12 10 -0.25 -12
  [4,16,4.5,-0.25,-11,-3.75,-0.25,-11,-10,-0.25,-12,10,-0.25,-12],
// 4 16 8.25 -0.25 0 8.25 -0.25 -7.5 10 -0.25 -12 10 -0.25 12
  [4,16,8.25,-0.25,0,8.25,-0.25,-7.5,10,-0.25,-12,10,-0.25,12],
// 4 16 5 -0.25 3.5 7 -0.25 5 -0.75 -0.25 5 -0.75 -0.25 3.5
  [4,16,5,-0.25,3.5,7,-0.25,5,-0.75,-0.25,5,-0.75,-0.25,3.5],
// 3 16 10 -0.25 12 7 -0.25 10 7 -0.25 5
  [3,16,10,-0.25,12,7,-0.25,10,7,-0.25,5],
// 3 16 5 -0.25 3.5 8.25 -0.25 0 7 -0.25 5
  [3,16,5,-0.25,3.5,8.25,-0.25,0,7,-0.25,5],
// 3 16 8.25 -0.25 0 10 -0.25 12 7 -0.25 5
  [3,16,8.25,-0.25,0,10,-0.25,12,7,-0.25,5],
// 3 16 8.25 -0.25 -7.5 4.5 -0.25 -11 10 -0.25 -12
  [3,16,8.25,-0.25,-7.5,4.5,-0.25,-11,10,-0.25,-12],
// 3 16 -10 -0.25 -12 -3.75 -0.25 -11 -7.5 -0.25 -7
  [3,16,-10,-0.25,-12,-3.75,-0.25,-11,-7.5,-0.25,-7],
// 0 // Pattern created wholly or in part by Quad2Dat
// 0 // Thanks James
// 1 16 0 -0.25 0 10 0 0 0 0.25 0 0 0 12 box5-12.dat
  [1,16,0,-0.25,0,10,0,0,0,0.25,0,0,0,12, ldraw_lib__box5_12(realsolid)],
];
module ldraw_lib__164365c(step=0, col=false, unit=2/5, alt=false, line=0.2, solid=!$preview)
    makepoly(ldraw_lib__164365c(solid), step=step, col=col, unit=unit, alt=alt, line=line, solid=solid);
ldraw_lib__164365c(line=0.2);
// main file
use <../lib.scad>
use <164365c.scad>
$fa=1; $fs=0.2;
function ldraw_lib__165345c(realsolid=false) = [
// 0 =Sticker  1.2 x  1 with Red Outline "5"
// 0 Name: 165345c.dat
// 0 Author: Takeshi Takahashi [RainbowDolphin]
// 0 !LDRAW_ORG Part Alias UPDATE 2023-01
// 0 !LICENSE Licensed under CC BY 2.0 and CC BY 4.0 : see CAreadme.txt
// 
// 0 BFC CERTIFY CCW
  [0,"BFC","CERTIFY"],
  [0,"BFC","CCW"],
// 
// 0 !KEYWORDS Mag racer, Rally, Set 6648
// 
// 0 !HISTORY 2023-03-05 [OrionP] Official Update 2023-01
// 
// 
// 0 // Alias of 164365c
// 1 16 0 0 0 1 0 0 0 1 0 0 0 1 164365c.dat
  [1,16,0,0,0,1,0,0,0,1,0,0,0,1, ldraw_lib__164365c(realsolid)],
];
module ldraw_lib__165345c(step=0, col=false, unit=2/5, alt=false, line=0.2, solid=!$preview)
    makepoly(ldraw_lib__165345c(solid), step=step, col=col, unit=unit, alt=alt, line=line, solid=solid);
ldraw_lib__165345c(line=0.2);
